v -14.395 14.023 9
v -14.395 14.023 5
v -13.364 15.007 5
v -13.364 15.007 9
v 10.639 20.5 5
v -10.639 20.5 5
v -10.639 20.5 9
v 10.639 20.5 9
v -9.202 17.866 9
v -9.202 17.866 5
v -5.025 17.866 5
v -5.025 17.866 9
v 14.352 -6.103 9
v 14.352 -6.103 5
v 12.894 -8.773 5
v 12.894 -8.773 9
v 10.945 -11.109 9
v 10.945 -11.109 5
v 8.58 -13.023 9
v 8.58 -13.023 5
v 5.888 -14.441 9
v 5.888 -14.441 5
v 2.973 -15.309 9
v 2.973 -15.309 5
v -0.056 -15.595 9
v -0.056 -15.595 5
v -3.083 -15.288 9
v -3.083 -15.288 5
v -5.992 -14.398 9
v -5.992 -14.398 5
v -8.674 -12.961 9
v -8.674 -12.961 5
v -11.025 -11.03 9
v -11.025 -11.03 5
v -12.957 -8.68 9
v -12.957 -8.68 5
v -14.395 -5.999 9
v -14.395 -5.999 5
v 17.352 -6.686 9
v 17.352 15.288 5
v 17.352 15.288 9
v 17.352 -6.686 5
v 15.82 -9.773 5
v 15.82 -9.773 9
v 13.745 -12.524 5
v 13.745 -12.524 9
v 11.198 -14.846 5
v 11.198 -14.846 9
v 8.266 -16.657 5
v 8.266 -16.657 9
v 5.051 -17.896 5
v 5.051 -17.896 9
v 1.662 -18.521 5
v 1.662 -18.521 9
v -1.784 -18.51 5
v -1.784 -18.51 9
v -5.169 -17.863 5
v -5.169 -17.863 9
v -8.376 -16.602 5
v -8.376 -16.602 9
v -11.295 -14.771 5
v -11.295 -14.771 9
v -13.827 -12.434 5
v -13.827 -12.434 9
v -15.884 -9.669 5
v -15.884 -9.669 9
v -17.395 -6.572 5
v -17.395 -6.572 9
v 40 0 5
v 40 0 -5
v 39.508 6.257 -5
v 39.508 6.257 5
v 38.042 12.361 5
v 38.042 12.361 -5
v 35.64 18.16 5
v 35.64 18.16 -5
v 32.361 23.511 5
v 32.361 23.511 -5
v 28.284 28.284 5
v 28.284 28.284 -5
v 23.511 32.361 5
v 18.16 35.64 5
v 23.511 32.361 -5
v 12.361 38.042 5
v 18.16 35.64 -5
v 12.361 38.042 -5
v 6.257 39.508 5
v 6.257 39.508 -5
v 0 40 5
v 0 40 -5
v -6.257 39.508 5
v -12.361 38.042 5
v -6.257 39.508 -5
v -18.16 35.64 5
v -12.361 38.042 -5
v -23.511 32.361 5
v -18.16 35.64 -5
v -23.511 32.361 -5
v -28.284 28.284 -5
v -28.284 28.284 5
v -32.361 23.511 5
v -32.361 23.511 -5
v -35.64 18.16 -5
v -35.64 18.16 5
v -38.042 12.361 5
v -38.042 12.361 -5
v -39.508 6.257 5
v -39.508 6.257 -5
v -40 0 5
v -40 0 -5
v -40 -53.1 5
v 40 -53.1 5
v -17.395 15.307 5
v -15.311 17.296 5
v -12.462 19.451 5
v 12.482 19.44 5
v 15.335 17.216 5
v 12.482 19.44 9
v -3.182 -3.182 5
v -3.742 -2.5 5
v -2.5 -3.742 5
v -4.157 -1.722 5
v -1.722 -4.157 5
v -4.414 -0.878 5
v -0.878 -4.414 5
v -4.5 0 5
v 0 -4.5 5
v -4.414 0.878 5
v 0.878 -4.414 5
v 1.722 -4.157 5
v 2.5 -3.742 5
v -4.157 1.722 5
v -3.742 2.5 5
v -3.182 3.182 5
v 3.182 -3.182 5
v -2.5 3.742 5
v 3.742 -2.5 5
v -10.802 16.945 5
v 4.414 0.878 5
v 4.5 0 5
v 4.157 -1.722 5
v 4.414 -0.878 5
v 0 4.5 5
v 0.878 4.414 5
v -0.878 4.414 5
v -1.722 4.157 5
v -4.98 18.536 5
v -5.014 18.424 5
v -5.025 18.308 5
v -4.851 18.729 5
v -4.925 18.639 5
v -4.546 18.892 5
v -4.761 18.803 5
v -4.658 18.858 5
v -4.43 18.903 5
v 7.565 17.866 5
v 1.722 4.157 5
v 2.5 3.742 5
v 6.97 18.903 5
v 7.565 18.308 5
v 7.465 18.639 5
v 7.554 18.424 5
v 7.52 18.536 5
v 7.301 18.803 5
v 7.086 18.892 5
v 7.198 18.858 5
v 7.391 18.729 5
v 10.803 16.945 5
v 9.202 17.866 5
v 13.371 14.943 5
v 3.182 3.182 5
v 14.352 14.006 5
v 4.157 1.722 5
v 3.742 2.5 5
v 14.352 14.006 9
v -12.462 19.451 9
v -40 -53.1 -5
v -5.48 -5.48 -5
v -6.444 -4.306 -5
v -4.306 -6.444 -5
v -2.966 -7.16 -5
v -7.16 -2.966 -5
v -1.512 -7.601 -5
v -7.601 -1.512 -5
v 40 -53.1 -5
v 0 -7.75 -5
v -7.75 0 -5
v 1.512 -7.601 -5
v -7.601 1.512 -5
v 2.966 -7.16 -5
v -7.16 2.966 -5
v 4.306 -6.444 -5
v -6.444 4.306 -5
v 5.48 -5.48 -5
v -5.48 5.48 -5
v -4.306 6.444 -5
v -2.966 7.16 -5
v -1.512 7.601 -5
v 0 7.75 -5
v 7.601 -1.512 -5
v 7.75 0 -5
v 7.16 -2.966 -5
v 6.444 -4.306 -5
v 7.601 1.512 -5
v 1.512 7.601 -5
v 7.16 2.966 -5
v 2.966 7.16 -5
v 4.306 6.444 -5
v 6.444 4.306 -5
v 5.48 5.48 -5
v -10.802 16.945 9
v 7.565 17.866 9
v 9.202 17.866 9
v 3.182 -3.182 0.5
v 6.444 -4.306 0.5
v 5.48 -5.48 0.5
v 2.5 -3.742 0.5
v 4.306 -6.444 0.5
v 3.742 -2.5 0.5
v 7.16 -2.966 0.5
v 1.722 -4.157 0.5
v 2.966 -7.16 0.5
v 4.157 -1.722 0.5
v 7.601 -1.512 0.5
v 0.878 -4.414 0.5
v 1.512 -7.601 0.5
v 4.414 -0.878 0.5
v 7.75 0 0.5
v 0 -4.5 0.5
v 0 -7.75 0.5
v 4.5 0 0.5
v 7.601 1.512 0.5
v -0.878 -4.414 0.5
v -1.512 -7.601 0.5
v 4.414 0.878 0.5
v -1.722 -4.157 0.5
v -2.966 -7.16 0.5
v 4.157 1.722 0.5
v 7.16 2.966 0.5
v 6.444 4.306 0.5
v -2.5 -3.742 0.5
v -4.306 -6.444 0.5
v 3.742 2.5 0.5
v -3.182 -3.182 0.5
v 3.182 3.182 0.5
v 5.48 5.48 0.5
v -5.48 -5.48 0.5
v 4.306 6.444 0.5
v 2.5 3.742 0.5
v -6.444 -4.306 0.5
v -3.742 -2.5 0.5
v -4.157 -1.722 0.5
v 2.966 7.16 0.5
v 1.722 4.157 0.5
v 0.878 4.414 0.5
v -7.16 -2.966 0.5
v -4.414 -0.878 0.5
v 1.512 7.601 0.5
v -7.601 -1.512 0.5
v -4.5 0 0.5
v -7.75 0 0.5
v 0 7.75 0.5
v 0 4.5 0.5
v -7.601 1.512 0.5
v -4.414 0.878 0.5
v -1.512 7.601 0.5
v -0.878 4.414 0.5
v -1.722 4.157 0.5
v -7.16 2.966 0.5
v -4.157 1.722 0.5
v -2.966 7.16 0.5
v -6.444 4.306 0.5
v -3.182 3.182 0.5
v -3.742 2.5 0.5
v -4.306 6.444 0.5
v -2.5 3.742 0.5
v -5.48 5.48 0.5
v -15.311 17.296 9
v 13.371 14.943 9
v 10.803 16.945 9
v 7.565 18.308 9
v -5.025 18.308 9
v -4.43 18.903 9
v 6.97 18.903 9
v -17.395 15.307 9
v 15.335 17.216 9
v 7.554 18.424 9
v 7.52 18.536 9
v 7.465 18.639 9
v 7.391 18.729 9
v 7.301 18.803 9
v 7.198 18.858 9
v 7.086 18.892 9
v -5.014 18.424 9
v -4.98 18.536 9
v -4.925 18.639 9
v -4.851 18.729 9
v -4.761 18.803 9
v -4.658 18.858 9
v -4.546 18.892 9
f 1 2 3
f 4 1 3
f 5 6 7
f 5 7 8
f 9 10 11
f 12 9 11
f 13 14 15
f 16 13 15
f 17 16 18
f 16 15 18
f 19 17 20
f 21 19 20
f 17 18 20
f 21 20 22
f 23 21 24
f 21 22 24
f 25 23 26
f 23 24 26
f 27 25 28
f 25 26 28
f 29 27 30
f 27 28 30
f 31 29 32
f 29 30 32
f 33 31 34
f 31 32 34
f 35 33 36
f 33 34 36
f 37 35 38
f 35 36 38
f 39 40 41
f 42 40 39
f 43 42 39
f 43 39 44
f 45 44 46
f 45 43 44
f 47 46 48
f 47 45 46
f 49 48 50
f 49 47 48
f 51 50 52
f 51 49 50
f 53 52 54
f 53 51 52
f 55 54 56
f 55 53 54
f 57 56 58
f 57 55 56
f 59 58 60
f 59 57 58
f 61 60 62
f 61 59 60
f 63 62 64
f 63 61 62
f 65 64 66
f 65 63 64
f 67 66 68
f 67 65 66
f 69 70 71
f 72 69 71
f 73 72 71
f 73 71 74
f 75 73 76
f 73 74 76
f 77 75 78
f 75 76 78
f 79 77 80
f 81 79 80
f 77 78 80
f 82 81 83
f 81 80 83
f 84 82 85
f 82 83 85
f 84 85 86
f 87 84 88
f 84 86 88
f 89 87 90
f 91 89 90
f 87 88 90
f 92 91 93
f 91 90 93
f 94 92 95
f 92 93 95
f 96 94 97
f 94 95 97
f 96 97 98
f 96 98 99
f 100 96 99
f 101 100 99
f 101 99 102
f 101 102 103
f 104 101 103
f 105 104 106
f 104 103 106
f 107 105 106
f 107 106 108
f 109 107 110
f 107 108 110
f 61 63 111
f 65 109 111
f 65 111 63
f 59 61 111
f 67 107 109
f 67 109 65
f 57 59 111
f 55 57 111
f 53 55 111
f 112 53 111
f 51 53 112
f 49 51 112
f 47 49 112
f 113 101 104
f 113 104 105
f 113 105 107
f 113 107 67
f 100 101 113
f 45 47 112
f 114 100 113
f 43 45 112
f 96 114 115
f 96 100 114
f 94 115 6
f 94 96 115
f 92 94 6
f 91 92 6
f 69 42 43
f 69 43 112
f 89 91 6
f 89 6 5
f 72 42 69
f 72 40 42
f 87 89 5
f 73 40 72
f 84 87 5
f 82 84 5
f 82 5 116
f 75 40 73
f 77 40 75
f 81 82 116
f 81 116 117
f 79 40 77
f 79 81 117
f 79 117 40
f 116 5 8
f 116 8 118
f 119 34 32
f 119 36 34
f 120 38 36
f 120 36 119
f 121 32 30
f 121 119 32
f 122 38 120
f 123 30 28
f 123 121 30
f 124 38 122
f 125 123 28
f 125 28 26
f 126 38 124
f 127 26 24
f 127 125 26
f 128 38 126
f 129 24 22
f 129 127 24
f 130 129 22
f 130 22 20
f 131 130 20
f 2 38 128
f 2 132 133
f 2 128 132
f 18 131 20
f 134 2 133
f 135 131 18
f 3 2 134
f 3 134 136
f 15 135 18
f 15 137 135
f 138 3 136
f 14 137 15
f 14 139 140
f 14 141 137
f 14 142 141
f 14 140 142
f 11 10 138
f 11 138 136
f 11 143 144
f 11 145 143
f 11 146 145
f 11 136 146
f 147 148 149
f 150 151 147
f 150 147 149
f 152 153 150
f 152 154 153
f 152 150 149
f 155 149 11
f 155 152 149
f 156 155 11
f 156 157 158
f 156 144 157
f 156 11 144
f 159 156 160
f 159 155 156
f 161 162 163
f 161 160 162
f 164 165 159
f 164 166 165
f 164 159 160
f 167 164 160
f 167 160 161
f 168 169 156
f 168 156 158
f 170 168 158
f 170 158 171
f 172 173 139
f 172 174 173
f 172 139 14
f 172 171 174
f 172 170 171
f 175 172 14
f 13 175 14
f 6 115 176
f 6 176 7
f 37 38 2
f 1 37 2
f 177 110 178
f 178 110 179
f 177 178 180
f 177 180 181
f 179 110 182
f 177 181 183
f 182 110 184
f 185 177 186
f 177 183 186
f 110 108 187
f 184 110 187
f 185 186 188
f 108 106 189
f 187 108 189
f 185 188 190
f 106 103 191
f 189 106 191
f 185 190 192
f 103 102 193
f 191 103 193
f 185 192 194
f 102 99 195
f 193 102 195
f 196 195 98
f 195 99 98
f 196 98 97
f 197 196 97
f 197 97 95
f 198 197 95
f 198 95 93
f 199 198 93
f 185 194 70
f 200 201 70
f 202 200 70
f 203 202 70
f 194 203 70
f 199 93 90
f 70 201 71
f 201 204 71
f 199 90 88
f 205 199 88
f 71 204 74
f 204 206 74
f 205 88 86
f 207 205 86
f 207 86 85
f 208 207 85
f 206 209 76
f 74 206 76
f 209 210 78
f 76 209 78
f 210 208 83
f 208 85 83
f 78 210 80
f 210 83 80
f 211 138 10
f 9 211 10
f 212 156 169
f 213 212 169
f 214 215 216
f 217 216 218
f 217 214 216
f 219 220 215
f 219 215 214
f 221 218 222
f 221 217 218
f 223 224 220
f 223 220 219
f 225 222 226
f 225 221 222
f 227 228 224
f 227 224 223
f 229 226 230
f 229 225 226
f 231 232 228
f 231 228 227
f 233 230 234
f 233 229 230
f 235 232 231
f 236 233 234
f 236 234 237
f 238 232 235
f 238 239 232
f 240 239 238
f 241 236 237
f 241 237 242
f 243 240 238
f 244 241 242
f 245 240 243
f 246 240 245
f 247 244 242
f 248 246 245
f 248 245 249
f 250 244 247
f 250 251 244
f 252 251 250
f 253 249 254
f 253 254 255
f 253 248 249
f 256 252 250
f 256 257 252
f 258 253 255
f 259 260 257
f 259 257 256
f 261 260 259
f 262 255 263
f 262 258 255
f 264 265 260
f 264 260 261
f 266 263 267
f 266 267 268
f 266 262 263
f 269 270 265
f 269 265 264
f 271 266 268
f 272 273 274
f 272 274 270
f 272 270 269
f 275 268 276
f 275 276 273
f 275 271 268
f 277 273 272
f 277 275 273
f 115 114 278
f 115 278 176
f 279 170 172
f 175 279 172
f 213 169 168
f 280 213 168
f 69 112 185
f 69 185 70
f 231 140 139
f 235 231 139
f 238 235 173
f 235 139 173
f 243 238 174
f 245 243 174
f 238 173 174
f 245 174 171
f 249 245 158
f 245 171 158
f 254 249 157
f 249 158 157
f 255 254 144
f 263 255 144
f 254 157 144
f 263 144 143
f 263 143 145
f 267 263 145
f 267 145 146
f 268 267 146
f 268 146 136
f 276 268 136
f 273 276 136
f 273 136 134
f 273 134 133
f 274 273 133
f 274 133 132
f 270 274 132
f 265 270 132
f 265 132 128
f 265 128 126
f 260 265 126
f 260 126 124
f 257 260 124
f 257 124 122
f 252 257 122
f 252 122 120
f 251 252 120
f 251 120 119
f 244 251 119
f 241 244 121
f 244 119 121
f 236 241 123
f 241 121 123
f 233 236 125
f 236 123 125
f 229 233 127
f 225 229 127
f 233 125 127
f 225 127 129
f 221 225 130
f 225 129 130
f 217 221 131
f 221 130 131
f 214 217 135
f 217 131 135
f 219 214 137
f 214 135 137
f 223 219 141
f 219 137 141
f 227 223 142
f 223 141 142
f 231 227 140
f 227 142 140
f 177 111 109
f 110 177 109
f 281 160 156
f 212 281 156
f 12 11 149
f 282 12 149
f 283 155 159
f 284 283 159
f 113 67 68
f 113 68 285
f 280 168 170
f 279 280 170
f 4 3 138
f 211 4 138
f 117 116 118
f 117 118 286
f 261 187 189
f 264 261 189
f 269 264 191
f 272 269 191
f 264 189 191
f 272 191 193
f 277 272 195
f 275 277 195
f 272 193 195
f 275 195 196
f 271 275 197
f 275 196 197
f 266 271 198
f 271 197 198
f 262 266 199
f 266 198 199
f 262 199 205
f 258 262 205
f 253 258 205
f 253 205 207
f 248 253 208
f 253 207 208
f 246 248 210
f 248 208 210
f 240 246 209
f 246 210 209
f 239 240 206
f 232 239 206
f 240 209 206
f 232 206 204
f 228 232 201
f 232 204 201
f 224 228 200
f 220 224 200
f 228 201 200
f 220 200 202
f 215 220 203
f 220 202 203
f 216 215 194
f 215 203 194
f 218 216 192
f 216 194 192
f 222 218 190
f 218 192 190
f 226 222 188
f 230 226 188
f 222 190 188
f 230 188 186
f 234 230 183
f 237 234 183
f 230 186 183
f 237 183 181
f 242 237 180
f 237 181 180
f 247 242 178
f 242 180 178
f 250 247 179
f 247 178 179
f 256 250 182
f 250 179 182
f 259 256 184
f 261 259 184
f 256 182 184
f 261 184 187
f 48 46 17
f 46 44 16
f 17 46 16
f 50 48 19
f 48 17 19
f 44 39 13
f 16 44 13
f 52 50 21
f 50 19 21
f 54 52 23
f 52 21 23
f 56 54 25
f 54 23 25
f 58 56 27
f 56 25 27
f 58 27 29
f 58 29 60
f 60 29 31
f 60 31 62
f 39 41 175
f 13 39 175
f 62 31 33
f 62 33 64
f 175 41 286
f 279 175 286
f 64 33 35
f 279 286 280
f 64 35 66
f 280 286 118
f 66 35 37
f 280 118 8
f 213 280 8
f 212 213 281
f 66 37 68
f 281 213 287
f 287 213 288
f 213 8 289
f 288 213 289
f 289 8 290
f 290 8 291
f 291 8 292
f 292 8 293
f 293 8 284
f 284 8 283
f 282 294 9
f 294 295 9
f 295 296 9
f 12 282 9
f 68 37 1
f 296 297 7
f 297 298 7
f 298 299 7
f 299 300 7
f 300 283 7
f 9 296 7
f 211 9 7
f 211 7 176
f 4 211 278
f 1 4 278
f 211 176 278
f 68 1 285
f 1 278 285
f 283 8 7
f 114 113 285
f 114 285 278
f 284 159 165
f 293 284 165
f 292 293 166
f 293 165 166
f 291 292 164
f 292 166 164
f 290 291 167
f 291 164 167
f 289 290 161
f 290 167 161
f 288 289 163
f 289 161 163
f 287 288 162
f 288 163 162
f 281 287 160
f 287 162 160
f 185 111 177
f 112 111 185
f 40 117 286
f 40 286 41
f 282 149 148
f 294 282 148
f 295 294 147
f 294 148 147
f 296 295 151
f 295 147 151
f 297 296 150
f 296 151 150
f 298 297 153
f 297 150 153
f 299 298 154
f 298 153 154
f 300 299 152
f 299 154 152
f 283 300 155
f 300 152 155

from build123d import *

# Parameters (mm, degrees)
SKETCH6_W           = 80
SKETCH6_H           = 106.2
BOSS_EXTRUDE3_DEPTH = 5
BOSS_EXTRUDE2_DEPTH = 4
CUT_EXTRUDE2_REACH  = 69.228
SKETCH4_R           = 4.5
SKETCH7_R           = 7.75
CUT_EXTRUDE3_DEPTH  = 5.5
CUT_EXTRUDE4_START  = -5
CUT_EXTRUDE4_DEPTH  = 10


with BuildPart() as part:
    # Sketch6 → Boss-Extrude3 (new, symmetric)
    with BuildSketch(Plane.XY):
        Rectangle(SKETCH6_W, SKETCH6_H)
    extrude(amount=BOSS_EXTRUDE3_DEPTH, both=True)

    # Sketch3 → Boss-Extrude2 (add)
    with BuildSketch(Plane.XY.offset(5)):
        with BuildLine():
            Line((-17.395287132, -6.571810208), (-17.395287132, 15.307157848))
            Line((-17.395287132, 15.307157848), (-15.311099774, 17.296395792))
            Line((-15.311099774, 17.296395792), (-12.46185448, 19.451424939))
            Line((-12.46185448, 19.451424939), (-10.63935497, 20.5))
            Line((-10.63935497, 20.5), (10.639354967, 20.5))
            Line((10.639354967, 20.5), (12.481546734, 19.440095002))
            Line((12.481546734, 19.440095002), (15.334663563, 17.215949154))
            Line((15.334663563, 17.215949154), (17.351649475, 15.287999429))
            Line((17.351649475, 15.287999429), (17.351649475, -6.686177108))
            ThreePointArc((17.351649475, -6.686177108), (-0.061204642, -18.595186415), (-17.395287132, -6.571810208))
        make_face()
        with BuildLine():
            Line((-14.395287132, -5.999057373), (-14.395287132, 14.02336094))
            Line((-14.395287132, 14.02336094), (-13.364210648, 15.007464628))
            Line((-13.364210648, 15.007464628), (-10.802429685, 16.945069879))
            Line((-10.802429685, 16.945069879), (-9.202356052, 17.865672216))
            Line((-9.202356052, 17.865672216), (-5.025287127, 17.865672216))
            Line((-5.025287127, 17.865672216), (-5.025287127, 18.307908255))
            ThreePointArc((-5.025287127, 18.307908255), (-4.850962964, 18.728764013), (-4.430107206, 18.903088176))
            Line((-4.430107206, 18.903088176), (6.970107208, 18.903088176))
            ThreePointArc((6.970107208, 18.903088176), (7.390962965, 18.728764013), (7.565287128, 18.307908255))
            Line((7.565287128, 18.307908255), (7.565287128, 17.865672216))
            Line((7.565287128, 17.865672216), (9.202356049, 17.865672216))
            Line((9.202356049, 17.865672216), (10.803064919, 16.944704398))
            Line((10.803064919, 16.944704398), (13.37101734, 14.942858327))
            Line((13.37101734, 14.942858327), (14.351649475, 14.00551442))
            Line((14.351649475, 14.00551442), (14.351649475, -6.102715652))
            ThreePointArc((14.351649475, -6.102715652), (-0.056234518, -15.595185752), (-14.395287132, -5.999057373))
        make_face(mode=Mode.SUBTRACT)
    extrude(amount=BOSS_EXTRUDE2_DEPTH)

    # Sketch4 → Cut-Extrude2 (cut, up to next)
    with BuildSketch(Plane.XY.offset(5), mode=Mode.PRIVATE) as cut_extrude2_sk1:
        Circle(SKETCH4_R)
    cut_extrude2_tool1 = extrude(cut_extrude2_sk1.sketch, amount=-CUT_EXTRUDE2_REACH, mode=Mode.PRIVATE) & part.part
    add(cut_extrude2_tool1.solids().sort_by_distance((0, 0, 5))[0], mode=Mode.SUBTRACT)

    # Sketch7 → Cut-Extrude3 (cut)
    with BuildSketch(Plane(origin=(0, 0, -5), x_dir=(-1, 0, 0), z_dir=(0, 0, -1))):
        Circle(SKETCH7_R)
    extrude(amount=-CUT_EXTRUDE3_DEPTH, mode=Mode.SUBTRACT)

    # Sketch8 → Cut-Extrude4 (cut)
    with BuildSketch(Plane.XY.offset(CUT_EXTRUDE4_START)):
        with BuildLine():
            Line((-40, 0), (-40, 53.1))
            Line((-40, 53.1), (40, 53.1))
            Line((40, 53.1), (40, 0))
            ThreePointArc((40, 0), (0, 40), (-40, 0))
        make_face()
    extrude(amount=CUT_EXTRUDE4_DEPTH, mode=Mode.SUBTRACT)


solid = part.part
